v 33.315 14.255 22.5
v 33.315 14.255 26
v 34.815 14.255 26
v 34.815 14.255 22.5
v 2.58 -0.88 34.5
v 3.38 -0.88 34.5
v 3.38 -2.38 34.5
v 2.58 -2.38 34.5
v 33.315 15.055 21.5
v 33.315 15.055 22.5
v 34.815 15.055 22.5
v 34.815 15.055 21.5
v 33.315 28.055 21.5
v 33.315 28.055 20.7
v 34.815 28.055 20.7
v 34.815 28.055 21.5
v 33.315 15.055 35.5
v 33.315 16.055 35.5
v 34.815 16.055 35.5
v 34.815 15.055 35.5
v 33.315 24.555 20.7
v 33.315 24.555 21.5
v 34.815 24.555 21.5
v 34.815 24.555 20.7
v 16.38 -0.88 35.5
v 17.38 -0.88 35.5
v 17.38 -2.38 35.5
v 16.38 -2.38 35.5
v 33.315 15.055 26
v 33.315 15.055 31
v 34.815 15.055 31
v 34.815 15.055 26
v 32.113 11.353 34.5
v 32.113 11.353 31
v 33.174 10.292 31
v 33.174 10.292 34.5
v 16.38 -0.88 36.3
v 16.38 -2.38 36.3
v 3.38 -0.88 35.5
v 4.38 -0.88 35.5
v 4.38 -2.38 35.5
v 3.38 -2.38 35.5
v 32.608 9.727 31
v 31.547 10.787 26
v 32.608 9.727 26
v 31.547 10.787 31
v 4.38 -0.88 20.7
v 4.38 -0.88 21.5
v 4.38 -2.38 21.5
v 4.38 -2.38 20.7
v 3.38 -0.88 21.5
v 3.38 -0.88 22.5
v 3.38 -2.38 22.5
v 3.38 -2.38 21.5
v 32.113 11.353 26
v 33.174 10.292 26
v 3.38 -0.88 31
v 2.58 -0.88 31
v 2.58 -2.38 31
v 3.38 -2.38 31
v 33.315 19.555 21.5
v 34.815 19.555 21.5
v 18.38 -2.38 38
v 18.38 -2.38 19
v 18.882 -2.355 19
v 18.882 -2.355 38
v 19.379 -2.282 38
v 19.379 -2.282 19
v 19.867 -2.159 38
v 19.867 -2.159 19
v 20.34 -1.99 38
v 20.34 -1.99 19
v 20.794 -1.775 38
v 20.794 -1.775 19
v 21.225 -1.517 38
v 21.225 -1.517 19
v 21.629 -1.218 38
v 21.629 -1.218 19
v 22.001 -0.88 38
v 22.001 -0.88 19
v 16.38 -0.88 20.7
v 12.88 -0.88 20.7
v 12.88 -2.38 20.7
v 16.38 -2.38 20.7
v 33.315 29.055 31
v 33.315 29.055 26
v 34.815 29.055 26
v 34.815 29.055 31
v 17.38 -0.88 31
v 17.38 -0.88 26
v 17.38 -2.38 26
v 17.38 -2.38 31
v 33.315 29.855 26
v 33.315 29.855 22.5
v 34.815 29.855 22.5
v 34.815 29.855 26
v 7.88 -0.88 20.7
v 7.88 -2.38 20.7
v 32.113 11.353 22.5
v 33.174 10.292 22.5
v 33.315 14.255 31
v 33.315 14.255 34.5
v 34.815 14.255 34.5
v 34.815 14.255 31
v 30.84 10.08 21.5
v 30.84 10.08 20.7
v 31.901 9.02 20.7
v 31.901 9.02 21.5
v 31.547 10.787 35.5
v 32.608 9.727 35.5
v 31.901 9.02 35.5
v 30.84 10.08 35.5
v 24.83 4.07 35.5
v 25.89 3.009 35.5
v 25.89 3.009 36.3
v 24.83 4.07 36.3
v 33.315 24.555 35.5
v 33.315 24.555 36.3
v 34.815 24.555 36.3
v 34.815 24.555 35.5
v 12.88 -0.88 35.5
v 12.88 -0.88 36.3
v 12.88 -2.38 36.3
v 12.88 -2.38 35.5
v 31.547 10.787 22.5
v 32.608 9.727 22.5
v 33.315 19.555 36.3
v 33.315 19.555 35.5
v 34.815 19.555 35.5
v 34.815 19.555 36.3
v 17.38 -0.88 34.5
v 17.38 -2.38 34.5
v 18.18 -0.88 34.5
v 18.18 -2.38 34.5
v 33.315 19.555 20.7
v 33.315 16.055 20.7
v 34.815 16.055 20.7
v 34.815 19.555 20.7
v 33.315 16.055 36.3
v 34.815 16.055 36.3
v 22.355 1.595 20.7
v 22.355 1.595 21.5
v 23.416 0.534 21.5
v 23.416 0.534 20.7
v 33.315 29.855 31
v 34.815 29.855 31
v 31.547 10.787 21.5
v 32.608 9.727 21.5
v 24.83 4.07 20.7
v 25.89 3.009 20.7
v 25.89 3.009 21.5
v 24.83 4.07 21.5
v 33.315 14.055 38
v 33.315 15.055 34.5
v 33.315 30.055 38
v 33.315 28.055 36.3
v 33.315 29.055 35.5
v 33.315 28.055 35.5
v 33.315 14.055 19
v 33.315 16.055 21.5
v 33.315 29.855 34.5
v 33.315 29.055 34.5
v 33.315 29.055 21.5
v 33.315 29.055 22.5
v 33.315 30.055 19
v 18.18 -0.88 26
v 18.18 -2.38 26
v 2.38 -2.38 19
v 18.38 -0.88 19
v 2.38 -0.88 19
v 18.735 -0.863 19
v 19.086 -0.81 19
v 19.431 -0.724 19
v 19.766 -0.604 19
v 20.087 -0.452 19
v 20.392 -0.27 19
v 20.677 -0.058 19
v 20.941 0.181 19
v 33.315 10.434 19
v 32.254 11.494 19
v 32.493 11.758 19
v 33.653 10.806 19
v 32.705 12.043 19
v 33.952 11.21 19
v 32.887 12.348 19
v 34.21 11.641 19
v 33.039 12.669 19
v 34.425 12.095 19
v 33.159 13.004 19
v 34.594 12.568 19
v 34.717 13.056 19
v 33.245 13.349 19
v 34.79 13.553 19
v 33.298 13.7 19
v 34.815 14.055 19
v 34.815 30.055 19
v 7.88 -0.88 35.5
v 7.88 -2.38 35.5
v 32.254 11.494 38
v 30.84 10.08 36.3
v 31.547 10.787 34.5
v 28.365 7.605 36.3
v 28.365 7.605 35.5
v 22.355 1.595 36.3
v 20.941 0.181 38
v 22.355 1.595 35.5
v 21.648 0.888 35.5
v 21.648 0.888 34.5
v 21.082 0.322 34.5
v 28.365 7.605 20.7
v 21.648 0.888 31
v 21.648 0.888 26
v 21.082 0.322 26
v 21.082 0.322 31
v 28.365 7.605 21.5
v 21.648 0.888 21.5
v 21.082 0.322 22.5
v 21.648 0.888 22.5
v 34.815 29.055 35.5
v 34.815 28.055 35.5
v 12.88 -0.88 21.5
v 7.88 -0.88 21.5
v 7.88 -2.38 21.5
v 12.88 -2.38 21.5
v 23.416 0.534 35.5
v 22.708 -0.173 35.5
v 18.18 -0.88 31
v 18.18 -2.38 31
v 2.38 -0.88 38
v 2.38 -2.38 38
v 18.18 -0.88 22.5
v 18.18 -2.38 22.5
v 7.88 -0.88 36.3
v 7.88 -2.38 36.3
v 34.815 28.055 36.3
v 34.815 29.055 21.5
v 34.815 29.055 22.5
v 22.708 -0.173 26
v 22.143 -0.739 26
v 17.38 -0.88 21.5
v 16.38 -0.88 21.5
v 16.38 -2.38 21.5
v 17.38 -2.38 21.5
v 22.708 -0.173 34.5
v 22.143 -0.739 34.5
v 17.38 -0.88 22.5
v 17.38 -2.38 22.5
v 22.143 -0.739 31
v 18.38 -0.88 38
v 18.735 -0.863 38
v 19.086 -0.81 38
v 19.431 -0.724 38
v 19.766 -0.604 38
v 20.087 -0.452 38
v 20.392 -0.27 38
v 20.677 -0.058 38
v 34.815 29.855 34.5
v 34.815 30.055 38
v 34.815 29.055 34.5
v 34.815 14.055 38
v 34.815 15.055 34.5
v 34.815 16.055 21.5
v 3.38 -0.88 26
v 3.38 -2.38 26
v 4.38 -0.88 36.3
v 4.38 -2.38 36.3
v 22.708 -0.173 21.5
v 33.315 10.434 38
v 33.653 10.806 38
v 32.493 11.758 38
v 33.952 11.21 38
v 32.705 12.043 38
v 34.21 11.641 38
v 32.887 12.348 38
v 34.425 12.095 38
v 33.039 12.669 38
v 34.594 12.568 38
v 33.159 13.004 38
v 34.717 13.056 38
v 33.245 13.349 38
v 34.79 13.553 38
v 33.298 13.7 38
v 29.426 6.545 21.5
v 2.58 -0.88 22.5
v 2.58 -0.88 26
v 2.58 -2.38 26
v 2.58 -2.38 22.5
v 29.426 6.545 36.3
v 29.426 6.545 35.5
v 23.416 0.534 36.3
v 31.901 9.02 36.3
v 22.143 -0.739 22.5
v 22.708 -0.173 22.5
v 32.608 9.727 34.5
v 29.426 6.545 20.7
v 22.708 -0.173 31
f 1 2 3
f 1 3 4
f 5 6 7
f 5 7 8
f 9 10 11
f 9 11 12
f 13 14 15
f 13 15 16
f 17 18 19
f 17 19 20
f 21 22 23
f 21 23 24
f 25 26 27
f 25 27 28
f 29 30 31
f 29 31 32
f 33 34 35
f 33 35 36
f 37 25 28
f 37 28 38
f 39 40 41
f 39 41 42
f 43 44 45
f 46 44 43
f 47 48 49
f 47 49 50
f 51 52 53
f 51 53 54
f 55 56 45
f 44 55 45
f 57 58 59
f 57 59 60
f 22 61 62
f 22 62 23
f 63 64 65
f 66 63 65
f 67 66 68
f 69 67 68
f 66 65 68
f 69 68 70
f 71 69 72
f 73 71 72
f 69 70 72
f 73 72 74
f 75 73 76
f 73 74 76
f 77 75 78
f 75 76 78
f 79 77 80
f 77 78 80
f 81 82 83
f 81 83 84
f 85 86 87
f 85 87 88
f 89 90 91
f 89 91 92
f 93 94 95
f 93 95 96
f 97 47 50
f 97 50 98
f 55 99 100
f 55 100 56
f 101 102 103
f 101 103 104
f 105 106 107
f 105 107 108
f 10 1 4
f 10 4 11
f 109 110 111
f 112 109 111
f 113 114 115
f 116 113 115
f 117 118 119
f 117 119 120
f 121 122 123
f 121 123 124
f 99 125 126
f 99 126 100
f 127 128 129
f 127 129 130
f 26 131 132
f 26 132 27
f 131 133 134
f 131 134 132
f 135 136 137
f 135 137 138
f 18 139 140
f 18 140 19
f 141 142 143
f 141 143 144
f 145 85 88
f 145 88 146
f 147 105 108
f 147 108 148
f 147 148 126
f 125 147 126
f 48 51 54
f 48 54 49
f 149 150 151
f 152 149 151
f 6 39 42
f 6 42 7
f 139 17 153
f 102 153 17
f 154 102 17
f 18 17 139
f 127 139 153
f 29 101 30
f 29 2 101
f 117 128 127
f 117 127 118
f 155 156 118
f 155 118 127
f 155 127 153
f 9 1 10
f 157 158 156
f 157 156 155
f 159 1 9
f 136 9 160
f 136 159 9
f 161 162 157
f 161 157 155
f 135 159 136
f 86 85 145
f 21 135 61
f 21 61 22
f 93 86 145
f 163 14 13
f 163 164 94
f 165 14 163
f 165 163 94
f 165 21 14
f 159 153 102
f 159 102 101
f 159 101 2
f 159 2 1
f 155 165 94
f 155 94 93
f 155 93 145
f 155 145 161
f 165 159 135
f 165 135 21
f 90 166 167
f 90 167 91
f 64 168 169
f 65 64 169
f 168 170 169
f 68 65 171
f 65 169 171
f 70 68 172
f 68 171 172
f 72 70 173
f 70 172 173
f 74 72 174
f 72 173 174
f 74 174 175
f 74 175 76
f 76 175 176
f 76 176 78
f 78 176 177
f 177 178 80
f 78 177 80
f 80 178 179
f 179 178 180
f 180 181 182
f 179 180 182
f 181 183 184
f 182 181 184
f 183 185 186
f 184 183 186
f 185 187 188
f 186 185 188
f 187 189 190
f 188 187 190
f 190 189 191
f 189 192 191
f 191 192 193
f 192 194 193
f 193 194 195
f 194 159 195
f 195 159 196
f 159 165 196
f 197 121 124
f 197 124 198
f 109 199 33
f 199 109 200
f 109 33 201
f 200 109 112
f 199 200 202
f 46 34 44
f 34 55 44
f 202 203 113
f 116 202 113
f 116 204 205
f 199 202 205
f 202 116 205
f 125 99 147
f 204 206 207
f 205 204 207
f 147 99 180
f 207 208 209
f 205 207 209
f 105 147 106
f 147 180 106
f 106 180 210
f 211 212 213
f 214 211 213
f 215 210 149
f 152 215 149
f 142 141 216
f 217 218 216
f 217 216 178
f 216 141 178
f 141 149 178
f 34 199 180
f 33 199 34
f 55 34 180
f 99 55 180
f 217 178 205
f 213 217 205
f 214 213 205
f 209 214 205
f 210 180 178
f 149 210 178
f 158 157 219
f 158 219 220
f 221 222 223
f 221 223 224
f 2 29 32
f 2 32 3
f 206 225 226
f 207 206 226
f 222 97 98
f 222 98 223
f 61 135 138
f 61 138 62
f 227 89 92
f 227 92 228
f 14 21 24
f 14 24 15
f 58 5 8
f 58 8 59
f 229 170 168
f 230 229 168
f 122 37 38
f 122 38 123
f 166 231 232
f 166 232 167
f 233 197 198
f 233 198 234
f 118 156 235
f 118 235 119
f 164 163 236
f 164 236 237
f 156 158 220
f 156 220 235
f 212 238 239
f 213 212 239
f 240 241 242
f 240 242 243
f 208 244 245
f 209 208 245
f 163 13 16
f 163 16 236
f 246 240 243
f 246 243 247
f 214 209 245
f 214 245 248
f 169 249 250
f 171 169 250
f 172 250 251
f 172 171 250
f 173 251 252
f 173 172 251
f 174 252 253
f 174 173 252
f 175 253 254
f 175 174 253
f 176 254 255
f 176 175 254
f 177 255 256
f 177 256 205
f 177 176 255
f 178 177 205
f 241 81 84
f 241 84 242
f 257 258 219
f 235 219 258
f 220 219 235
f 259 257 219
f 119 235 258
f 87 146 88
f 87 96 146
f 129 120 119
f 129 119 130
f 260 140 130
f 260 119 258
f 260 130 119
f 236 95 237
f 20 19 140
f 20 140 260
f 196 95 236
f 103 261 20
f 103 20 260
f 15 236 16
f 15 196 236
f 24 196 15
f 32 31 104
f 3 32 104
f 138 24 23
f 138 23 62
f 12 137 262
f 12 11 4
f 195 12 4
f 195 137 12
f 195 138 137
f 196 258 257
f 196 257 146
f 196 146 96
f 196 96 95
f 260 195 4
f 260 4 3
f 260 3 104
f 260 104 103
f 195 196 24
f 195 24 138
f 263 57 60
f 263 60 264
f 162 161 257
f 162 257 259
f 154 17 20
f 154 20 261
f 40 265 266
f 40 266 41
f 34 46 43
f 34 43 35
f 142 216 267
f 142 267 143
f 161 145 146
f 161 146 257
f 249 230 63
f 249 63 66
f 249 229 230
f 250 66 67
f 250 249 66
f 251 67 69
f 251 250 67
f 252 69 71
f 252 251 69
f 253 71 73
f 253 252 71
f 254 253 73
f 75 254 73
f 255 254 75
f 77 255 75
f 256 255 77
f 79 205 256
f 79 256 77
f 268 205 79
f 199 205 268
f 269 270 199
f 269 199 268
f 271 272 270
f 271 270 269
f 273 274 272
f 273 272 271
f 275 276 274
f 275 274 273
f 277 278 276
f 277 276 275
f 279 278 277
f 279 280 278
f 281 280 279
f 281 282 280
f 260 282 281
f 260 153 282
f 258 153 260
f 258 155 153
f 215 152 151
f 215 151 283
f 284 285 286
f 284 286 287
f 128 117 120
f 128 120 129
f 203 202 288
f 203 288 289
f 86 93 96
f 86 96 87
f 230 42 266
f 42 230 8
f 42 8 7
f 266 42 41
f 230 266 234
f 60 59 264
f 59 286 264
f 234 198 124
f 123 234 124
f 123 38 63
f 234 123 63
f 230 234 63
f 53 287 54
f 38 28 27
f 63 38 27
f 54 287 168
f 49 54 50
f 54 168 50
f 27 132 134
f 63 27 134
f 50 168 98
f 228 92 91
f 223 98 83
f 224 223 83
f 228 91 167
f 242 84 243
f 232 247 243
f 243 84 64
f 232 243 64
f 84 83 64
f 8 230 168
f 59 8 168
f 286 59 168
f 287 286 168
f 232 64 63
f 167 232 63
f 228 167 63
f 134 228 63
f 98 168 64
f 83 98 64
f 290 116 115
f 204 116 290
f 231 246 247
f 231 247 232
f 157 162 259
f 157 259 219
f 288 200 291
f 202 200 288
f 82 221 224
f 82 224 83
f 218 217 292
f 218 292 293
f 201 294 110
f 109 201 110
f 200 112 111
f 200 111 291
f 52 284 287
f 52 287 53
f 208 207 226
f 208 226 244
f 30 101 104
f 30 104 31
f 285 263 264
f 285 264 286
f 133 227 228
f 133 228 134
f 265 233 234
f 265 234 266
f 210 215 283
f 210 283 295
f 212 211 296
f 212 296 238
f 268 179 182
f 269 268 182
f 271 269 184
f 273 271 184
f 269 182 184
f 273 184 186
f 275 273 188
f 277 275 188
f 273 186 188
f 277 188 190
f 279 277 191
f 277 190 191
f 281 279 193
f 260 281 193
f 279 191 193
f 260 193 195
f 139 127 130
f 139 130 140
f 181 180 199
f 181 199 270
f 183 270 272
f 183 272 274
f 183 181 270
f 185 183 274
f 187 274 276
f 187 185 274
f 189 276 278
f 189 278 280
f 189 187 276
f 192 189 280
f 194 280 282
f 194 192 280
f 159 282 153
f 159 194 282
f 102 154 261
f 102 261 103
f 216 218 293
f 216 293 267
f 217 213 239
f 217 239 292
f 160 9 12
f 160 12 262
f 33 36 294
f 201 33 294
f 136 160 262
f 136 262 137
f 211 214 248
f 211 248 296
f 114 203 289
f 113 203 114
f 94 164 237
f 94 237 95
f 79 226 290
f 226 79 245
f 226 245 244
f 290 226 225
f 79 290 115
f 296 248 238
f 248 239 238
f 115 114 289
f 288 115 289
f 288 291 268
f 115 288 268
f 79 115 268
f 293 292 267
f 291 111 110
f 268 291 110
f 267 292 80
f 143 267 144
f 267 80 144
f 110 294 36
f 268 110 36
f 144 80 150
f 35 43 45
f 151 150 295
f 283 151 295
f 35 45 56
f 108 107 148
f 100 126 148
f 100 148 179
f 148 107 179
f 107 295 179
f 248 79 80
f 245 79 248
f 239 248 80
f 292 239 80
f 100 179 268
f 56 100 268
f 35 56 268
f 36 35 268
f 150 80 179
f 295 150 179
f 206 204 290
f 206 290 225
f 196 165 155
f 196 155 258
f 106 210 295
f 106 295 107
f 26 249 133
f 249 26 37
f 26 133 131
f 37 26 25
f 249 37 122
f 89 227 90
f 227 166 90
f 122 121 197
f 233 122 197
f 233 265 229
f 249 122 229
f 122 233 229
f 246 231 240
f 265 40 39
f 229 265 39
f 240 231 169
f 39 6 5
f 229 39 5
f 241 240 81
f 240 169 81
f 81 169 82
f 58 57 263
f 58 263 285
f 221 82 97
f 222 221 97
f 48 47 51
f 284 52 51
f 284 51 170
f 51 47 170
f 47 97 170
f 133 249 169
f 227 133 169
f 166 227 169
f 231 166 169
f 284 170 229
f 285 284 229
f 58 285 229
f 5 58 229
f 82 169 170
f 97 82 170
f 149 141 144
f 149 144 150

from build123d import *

# Parameters (mm, degrees)
PAD_DEPTH       = 19
POCKET_DEPTH    = 11.62232
POCKET002_DEPTH = 1.501
POCKET003_DEPTH = 1.501


with BuildPart() as part:
    # Sketch → Pad (new body)
    with BuildSketch(Plane.XY):
        with BuildLine():
            Line((0, 0), (16, 0))
            ThreePointArc((16, 0), (17.959845, 0.389838), (19.62132, 1.500001))
            Line((19.62132, 1.500001), (30.935023, 12.813715))
            ThreePointArc((30.935023, 12.813715), (32.045185, 14.475191), (32.435022, 16.435035))
            Line((32.435022, 32.435035), (32.435022, 16.435035))
            Line((30.935022, 32.435035), (32.435022, 32.435035))
            Line((30.935022, 16.435035), (30.935022, 32.435035))
            ThreePointArc((29.874363, 13.874375), (30.659366, 15.049216), (30.935022, 16.435035))
            Line((29.874363, 13.874375), (18.56066, 2.560661))
            ThreePointArc((16, 1.5), (17.385819, 1.775657), (18.56066, 2.560661))
            Line((16, 1.5), (0, 1.5))
            Line((0, 1.5), (0, 0))
        make_face()
    extrude(amount=PAD_DEPTH)

    # Sketch004 → Pocket (cut, through all)
    with BuildSketch(Plane(origin=(8.000009, -8.000001, 0), x_dir=(-0.707106, -0.707107, 0), z_dir=(-0.707107, 0.707106, 0))):
        Polygon((-28.935023, 17.3), (-25.435023, 17.3), (-25.435023, 16.5), (-20.435023, 16.5), (-20.435023, 17.3), (-16.935023, 17.3), (-16.935023, 16.5), (-15.935023, 16.5), (-15.935023, 15.5), (-15.135024, 15.5), (-15.135024, 12), (-15.935023, 12), (-15.935023, 7), (-15.135024, 7), (-15.135024, 3.5), (-15.935023, 3.5), (-15.935023, 2.5), (-16.935023, 2.5), (-16.935023, 1.7), (-20.435023, 1.7), (-20.435023, 2.5), (-25.435023, 2.5), (-25.435023, 1.7), (-28.935023, 1.7), (-28.935023, 2.5), (-29.935023, 2.5), (-29.935023, 3.5), (-30.735024, 3.5), (-30.735024, 7), (-29.935023, 7), (-29.935023, 12), (-30.735024, 12), (-30.735024, 15.5), (-29.935023, 15.5), (-29.935023, 16.5), (-28.935023, 16.5), align=None)
    extrude(amount=-POCKET_DEPTH, mode=Mode.SUBTRACT)

    # Sketch004001 → Pocket002 (cut, through all)
    with BuildSketch(Plane(origin=(30.935022, 0, 0), x_dir=(0, -1, 0), z_dir=(-1, 0, 0))):
        Polygon((-30.435035, 17.3), (-26.935035, 17.3), (-26.935035, 16.5), (-21.935035, 16.5), (-21.935035, 17.3), (-18.435035, 17.3), (-18.435035, 16.5), (-17.435035, 16.5), (-17.435035, 15.5), (-16.635036, 15.5), (-16.635036, 12), (-17.435035, 12), (-17.435035, 7), (-16.635036, 7), (-16.635036, 3.5), (-17.435035, 3.5), (-17.435035, 2.5), (-18.435035, 2.5), (-18.435035, 1.7), (-21.935035, 1.7), (-21.935035, 2.5), (-26.935035, 2.5), (-26.935035, 1.7), (-30.435035, 1.7), (-30.435035, 2.5), (-31.435035, 2.5), (-31.435035, 3.5), (-32.235036, 3.5), (-32.235036, 7), (-31.435035, 7), (-31.435035, 12), (-32.235036, 12), (-32.235036, 15.5), (-31.435035, 15.5), (-31.435035, 16.5), (-30.435035, 16.5), align=None)
    extrude(amount=-POCKET002_DEPTH, mode=Mode.SUBTRACT)

    # Sketch004001001 → Pocket003 (cut, through all)
    with BuildSketch(Plane(origin=(0, 1.5, 0), x_dir=(-1, 0, 0), z_dir=(0, 1, 0))):
        Polygon((-14, 17.3), (-10.5, 17.3), (-10.5, 16.5), (-5.5, 16.5), (-5.5, 17.3), (-2, 17.3), (-2, 16.5), (-1, 16.5), (-1, 15.5), (-0.200001, 15.5), (-0.200001, 12), (-1, 12), (-1, 7), (-0.200001, 7), (-0.200001, 3.5), (-1, 3.5), (-1, 2.5), (-2, 2.5), (-2, 1.7), (-5.5, 1.7), (-5.5, 2.5), (-10.5, 2.5), (-10.5, 1.7), (-14, 1.7), (-14, 2.5), (-15, 2.5), (-15, 3.5), (-15.800001, 3.5), (-15.800001, 7), (-15, 7), (-15, 12), (-15.800001, 12), (-15.800001, 15.5), (-15, 15.5), (-15, 16.5), (-14, 16.5), align=None)
    extrude(amount=-POCKET003_DEPTH, mode=Mode.SUBTRACT)


with BuildPart() as part_1:
    # Clone placement: moved
    add(part.part.moved(Location((2.38, -2.38, 19))))


solid = part_1.part
